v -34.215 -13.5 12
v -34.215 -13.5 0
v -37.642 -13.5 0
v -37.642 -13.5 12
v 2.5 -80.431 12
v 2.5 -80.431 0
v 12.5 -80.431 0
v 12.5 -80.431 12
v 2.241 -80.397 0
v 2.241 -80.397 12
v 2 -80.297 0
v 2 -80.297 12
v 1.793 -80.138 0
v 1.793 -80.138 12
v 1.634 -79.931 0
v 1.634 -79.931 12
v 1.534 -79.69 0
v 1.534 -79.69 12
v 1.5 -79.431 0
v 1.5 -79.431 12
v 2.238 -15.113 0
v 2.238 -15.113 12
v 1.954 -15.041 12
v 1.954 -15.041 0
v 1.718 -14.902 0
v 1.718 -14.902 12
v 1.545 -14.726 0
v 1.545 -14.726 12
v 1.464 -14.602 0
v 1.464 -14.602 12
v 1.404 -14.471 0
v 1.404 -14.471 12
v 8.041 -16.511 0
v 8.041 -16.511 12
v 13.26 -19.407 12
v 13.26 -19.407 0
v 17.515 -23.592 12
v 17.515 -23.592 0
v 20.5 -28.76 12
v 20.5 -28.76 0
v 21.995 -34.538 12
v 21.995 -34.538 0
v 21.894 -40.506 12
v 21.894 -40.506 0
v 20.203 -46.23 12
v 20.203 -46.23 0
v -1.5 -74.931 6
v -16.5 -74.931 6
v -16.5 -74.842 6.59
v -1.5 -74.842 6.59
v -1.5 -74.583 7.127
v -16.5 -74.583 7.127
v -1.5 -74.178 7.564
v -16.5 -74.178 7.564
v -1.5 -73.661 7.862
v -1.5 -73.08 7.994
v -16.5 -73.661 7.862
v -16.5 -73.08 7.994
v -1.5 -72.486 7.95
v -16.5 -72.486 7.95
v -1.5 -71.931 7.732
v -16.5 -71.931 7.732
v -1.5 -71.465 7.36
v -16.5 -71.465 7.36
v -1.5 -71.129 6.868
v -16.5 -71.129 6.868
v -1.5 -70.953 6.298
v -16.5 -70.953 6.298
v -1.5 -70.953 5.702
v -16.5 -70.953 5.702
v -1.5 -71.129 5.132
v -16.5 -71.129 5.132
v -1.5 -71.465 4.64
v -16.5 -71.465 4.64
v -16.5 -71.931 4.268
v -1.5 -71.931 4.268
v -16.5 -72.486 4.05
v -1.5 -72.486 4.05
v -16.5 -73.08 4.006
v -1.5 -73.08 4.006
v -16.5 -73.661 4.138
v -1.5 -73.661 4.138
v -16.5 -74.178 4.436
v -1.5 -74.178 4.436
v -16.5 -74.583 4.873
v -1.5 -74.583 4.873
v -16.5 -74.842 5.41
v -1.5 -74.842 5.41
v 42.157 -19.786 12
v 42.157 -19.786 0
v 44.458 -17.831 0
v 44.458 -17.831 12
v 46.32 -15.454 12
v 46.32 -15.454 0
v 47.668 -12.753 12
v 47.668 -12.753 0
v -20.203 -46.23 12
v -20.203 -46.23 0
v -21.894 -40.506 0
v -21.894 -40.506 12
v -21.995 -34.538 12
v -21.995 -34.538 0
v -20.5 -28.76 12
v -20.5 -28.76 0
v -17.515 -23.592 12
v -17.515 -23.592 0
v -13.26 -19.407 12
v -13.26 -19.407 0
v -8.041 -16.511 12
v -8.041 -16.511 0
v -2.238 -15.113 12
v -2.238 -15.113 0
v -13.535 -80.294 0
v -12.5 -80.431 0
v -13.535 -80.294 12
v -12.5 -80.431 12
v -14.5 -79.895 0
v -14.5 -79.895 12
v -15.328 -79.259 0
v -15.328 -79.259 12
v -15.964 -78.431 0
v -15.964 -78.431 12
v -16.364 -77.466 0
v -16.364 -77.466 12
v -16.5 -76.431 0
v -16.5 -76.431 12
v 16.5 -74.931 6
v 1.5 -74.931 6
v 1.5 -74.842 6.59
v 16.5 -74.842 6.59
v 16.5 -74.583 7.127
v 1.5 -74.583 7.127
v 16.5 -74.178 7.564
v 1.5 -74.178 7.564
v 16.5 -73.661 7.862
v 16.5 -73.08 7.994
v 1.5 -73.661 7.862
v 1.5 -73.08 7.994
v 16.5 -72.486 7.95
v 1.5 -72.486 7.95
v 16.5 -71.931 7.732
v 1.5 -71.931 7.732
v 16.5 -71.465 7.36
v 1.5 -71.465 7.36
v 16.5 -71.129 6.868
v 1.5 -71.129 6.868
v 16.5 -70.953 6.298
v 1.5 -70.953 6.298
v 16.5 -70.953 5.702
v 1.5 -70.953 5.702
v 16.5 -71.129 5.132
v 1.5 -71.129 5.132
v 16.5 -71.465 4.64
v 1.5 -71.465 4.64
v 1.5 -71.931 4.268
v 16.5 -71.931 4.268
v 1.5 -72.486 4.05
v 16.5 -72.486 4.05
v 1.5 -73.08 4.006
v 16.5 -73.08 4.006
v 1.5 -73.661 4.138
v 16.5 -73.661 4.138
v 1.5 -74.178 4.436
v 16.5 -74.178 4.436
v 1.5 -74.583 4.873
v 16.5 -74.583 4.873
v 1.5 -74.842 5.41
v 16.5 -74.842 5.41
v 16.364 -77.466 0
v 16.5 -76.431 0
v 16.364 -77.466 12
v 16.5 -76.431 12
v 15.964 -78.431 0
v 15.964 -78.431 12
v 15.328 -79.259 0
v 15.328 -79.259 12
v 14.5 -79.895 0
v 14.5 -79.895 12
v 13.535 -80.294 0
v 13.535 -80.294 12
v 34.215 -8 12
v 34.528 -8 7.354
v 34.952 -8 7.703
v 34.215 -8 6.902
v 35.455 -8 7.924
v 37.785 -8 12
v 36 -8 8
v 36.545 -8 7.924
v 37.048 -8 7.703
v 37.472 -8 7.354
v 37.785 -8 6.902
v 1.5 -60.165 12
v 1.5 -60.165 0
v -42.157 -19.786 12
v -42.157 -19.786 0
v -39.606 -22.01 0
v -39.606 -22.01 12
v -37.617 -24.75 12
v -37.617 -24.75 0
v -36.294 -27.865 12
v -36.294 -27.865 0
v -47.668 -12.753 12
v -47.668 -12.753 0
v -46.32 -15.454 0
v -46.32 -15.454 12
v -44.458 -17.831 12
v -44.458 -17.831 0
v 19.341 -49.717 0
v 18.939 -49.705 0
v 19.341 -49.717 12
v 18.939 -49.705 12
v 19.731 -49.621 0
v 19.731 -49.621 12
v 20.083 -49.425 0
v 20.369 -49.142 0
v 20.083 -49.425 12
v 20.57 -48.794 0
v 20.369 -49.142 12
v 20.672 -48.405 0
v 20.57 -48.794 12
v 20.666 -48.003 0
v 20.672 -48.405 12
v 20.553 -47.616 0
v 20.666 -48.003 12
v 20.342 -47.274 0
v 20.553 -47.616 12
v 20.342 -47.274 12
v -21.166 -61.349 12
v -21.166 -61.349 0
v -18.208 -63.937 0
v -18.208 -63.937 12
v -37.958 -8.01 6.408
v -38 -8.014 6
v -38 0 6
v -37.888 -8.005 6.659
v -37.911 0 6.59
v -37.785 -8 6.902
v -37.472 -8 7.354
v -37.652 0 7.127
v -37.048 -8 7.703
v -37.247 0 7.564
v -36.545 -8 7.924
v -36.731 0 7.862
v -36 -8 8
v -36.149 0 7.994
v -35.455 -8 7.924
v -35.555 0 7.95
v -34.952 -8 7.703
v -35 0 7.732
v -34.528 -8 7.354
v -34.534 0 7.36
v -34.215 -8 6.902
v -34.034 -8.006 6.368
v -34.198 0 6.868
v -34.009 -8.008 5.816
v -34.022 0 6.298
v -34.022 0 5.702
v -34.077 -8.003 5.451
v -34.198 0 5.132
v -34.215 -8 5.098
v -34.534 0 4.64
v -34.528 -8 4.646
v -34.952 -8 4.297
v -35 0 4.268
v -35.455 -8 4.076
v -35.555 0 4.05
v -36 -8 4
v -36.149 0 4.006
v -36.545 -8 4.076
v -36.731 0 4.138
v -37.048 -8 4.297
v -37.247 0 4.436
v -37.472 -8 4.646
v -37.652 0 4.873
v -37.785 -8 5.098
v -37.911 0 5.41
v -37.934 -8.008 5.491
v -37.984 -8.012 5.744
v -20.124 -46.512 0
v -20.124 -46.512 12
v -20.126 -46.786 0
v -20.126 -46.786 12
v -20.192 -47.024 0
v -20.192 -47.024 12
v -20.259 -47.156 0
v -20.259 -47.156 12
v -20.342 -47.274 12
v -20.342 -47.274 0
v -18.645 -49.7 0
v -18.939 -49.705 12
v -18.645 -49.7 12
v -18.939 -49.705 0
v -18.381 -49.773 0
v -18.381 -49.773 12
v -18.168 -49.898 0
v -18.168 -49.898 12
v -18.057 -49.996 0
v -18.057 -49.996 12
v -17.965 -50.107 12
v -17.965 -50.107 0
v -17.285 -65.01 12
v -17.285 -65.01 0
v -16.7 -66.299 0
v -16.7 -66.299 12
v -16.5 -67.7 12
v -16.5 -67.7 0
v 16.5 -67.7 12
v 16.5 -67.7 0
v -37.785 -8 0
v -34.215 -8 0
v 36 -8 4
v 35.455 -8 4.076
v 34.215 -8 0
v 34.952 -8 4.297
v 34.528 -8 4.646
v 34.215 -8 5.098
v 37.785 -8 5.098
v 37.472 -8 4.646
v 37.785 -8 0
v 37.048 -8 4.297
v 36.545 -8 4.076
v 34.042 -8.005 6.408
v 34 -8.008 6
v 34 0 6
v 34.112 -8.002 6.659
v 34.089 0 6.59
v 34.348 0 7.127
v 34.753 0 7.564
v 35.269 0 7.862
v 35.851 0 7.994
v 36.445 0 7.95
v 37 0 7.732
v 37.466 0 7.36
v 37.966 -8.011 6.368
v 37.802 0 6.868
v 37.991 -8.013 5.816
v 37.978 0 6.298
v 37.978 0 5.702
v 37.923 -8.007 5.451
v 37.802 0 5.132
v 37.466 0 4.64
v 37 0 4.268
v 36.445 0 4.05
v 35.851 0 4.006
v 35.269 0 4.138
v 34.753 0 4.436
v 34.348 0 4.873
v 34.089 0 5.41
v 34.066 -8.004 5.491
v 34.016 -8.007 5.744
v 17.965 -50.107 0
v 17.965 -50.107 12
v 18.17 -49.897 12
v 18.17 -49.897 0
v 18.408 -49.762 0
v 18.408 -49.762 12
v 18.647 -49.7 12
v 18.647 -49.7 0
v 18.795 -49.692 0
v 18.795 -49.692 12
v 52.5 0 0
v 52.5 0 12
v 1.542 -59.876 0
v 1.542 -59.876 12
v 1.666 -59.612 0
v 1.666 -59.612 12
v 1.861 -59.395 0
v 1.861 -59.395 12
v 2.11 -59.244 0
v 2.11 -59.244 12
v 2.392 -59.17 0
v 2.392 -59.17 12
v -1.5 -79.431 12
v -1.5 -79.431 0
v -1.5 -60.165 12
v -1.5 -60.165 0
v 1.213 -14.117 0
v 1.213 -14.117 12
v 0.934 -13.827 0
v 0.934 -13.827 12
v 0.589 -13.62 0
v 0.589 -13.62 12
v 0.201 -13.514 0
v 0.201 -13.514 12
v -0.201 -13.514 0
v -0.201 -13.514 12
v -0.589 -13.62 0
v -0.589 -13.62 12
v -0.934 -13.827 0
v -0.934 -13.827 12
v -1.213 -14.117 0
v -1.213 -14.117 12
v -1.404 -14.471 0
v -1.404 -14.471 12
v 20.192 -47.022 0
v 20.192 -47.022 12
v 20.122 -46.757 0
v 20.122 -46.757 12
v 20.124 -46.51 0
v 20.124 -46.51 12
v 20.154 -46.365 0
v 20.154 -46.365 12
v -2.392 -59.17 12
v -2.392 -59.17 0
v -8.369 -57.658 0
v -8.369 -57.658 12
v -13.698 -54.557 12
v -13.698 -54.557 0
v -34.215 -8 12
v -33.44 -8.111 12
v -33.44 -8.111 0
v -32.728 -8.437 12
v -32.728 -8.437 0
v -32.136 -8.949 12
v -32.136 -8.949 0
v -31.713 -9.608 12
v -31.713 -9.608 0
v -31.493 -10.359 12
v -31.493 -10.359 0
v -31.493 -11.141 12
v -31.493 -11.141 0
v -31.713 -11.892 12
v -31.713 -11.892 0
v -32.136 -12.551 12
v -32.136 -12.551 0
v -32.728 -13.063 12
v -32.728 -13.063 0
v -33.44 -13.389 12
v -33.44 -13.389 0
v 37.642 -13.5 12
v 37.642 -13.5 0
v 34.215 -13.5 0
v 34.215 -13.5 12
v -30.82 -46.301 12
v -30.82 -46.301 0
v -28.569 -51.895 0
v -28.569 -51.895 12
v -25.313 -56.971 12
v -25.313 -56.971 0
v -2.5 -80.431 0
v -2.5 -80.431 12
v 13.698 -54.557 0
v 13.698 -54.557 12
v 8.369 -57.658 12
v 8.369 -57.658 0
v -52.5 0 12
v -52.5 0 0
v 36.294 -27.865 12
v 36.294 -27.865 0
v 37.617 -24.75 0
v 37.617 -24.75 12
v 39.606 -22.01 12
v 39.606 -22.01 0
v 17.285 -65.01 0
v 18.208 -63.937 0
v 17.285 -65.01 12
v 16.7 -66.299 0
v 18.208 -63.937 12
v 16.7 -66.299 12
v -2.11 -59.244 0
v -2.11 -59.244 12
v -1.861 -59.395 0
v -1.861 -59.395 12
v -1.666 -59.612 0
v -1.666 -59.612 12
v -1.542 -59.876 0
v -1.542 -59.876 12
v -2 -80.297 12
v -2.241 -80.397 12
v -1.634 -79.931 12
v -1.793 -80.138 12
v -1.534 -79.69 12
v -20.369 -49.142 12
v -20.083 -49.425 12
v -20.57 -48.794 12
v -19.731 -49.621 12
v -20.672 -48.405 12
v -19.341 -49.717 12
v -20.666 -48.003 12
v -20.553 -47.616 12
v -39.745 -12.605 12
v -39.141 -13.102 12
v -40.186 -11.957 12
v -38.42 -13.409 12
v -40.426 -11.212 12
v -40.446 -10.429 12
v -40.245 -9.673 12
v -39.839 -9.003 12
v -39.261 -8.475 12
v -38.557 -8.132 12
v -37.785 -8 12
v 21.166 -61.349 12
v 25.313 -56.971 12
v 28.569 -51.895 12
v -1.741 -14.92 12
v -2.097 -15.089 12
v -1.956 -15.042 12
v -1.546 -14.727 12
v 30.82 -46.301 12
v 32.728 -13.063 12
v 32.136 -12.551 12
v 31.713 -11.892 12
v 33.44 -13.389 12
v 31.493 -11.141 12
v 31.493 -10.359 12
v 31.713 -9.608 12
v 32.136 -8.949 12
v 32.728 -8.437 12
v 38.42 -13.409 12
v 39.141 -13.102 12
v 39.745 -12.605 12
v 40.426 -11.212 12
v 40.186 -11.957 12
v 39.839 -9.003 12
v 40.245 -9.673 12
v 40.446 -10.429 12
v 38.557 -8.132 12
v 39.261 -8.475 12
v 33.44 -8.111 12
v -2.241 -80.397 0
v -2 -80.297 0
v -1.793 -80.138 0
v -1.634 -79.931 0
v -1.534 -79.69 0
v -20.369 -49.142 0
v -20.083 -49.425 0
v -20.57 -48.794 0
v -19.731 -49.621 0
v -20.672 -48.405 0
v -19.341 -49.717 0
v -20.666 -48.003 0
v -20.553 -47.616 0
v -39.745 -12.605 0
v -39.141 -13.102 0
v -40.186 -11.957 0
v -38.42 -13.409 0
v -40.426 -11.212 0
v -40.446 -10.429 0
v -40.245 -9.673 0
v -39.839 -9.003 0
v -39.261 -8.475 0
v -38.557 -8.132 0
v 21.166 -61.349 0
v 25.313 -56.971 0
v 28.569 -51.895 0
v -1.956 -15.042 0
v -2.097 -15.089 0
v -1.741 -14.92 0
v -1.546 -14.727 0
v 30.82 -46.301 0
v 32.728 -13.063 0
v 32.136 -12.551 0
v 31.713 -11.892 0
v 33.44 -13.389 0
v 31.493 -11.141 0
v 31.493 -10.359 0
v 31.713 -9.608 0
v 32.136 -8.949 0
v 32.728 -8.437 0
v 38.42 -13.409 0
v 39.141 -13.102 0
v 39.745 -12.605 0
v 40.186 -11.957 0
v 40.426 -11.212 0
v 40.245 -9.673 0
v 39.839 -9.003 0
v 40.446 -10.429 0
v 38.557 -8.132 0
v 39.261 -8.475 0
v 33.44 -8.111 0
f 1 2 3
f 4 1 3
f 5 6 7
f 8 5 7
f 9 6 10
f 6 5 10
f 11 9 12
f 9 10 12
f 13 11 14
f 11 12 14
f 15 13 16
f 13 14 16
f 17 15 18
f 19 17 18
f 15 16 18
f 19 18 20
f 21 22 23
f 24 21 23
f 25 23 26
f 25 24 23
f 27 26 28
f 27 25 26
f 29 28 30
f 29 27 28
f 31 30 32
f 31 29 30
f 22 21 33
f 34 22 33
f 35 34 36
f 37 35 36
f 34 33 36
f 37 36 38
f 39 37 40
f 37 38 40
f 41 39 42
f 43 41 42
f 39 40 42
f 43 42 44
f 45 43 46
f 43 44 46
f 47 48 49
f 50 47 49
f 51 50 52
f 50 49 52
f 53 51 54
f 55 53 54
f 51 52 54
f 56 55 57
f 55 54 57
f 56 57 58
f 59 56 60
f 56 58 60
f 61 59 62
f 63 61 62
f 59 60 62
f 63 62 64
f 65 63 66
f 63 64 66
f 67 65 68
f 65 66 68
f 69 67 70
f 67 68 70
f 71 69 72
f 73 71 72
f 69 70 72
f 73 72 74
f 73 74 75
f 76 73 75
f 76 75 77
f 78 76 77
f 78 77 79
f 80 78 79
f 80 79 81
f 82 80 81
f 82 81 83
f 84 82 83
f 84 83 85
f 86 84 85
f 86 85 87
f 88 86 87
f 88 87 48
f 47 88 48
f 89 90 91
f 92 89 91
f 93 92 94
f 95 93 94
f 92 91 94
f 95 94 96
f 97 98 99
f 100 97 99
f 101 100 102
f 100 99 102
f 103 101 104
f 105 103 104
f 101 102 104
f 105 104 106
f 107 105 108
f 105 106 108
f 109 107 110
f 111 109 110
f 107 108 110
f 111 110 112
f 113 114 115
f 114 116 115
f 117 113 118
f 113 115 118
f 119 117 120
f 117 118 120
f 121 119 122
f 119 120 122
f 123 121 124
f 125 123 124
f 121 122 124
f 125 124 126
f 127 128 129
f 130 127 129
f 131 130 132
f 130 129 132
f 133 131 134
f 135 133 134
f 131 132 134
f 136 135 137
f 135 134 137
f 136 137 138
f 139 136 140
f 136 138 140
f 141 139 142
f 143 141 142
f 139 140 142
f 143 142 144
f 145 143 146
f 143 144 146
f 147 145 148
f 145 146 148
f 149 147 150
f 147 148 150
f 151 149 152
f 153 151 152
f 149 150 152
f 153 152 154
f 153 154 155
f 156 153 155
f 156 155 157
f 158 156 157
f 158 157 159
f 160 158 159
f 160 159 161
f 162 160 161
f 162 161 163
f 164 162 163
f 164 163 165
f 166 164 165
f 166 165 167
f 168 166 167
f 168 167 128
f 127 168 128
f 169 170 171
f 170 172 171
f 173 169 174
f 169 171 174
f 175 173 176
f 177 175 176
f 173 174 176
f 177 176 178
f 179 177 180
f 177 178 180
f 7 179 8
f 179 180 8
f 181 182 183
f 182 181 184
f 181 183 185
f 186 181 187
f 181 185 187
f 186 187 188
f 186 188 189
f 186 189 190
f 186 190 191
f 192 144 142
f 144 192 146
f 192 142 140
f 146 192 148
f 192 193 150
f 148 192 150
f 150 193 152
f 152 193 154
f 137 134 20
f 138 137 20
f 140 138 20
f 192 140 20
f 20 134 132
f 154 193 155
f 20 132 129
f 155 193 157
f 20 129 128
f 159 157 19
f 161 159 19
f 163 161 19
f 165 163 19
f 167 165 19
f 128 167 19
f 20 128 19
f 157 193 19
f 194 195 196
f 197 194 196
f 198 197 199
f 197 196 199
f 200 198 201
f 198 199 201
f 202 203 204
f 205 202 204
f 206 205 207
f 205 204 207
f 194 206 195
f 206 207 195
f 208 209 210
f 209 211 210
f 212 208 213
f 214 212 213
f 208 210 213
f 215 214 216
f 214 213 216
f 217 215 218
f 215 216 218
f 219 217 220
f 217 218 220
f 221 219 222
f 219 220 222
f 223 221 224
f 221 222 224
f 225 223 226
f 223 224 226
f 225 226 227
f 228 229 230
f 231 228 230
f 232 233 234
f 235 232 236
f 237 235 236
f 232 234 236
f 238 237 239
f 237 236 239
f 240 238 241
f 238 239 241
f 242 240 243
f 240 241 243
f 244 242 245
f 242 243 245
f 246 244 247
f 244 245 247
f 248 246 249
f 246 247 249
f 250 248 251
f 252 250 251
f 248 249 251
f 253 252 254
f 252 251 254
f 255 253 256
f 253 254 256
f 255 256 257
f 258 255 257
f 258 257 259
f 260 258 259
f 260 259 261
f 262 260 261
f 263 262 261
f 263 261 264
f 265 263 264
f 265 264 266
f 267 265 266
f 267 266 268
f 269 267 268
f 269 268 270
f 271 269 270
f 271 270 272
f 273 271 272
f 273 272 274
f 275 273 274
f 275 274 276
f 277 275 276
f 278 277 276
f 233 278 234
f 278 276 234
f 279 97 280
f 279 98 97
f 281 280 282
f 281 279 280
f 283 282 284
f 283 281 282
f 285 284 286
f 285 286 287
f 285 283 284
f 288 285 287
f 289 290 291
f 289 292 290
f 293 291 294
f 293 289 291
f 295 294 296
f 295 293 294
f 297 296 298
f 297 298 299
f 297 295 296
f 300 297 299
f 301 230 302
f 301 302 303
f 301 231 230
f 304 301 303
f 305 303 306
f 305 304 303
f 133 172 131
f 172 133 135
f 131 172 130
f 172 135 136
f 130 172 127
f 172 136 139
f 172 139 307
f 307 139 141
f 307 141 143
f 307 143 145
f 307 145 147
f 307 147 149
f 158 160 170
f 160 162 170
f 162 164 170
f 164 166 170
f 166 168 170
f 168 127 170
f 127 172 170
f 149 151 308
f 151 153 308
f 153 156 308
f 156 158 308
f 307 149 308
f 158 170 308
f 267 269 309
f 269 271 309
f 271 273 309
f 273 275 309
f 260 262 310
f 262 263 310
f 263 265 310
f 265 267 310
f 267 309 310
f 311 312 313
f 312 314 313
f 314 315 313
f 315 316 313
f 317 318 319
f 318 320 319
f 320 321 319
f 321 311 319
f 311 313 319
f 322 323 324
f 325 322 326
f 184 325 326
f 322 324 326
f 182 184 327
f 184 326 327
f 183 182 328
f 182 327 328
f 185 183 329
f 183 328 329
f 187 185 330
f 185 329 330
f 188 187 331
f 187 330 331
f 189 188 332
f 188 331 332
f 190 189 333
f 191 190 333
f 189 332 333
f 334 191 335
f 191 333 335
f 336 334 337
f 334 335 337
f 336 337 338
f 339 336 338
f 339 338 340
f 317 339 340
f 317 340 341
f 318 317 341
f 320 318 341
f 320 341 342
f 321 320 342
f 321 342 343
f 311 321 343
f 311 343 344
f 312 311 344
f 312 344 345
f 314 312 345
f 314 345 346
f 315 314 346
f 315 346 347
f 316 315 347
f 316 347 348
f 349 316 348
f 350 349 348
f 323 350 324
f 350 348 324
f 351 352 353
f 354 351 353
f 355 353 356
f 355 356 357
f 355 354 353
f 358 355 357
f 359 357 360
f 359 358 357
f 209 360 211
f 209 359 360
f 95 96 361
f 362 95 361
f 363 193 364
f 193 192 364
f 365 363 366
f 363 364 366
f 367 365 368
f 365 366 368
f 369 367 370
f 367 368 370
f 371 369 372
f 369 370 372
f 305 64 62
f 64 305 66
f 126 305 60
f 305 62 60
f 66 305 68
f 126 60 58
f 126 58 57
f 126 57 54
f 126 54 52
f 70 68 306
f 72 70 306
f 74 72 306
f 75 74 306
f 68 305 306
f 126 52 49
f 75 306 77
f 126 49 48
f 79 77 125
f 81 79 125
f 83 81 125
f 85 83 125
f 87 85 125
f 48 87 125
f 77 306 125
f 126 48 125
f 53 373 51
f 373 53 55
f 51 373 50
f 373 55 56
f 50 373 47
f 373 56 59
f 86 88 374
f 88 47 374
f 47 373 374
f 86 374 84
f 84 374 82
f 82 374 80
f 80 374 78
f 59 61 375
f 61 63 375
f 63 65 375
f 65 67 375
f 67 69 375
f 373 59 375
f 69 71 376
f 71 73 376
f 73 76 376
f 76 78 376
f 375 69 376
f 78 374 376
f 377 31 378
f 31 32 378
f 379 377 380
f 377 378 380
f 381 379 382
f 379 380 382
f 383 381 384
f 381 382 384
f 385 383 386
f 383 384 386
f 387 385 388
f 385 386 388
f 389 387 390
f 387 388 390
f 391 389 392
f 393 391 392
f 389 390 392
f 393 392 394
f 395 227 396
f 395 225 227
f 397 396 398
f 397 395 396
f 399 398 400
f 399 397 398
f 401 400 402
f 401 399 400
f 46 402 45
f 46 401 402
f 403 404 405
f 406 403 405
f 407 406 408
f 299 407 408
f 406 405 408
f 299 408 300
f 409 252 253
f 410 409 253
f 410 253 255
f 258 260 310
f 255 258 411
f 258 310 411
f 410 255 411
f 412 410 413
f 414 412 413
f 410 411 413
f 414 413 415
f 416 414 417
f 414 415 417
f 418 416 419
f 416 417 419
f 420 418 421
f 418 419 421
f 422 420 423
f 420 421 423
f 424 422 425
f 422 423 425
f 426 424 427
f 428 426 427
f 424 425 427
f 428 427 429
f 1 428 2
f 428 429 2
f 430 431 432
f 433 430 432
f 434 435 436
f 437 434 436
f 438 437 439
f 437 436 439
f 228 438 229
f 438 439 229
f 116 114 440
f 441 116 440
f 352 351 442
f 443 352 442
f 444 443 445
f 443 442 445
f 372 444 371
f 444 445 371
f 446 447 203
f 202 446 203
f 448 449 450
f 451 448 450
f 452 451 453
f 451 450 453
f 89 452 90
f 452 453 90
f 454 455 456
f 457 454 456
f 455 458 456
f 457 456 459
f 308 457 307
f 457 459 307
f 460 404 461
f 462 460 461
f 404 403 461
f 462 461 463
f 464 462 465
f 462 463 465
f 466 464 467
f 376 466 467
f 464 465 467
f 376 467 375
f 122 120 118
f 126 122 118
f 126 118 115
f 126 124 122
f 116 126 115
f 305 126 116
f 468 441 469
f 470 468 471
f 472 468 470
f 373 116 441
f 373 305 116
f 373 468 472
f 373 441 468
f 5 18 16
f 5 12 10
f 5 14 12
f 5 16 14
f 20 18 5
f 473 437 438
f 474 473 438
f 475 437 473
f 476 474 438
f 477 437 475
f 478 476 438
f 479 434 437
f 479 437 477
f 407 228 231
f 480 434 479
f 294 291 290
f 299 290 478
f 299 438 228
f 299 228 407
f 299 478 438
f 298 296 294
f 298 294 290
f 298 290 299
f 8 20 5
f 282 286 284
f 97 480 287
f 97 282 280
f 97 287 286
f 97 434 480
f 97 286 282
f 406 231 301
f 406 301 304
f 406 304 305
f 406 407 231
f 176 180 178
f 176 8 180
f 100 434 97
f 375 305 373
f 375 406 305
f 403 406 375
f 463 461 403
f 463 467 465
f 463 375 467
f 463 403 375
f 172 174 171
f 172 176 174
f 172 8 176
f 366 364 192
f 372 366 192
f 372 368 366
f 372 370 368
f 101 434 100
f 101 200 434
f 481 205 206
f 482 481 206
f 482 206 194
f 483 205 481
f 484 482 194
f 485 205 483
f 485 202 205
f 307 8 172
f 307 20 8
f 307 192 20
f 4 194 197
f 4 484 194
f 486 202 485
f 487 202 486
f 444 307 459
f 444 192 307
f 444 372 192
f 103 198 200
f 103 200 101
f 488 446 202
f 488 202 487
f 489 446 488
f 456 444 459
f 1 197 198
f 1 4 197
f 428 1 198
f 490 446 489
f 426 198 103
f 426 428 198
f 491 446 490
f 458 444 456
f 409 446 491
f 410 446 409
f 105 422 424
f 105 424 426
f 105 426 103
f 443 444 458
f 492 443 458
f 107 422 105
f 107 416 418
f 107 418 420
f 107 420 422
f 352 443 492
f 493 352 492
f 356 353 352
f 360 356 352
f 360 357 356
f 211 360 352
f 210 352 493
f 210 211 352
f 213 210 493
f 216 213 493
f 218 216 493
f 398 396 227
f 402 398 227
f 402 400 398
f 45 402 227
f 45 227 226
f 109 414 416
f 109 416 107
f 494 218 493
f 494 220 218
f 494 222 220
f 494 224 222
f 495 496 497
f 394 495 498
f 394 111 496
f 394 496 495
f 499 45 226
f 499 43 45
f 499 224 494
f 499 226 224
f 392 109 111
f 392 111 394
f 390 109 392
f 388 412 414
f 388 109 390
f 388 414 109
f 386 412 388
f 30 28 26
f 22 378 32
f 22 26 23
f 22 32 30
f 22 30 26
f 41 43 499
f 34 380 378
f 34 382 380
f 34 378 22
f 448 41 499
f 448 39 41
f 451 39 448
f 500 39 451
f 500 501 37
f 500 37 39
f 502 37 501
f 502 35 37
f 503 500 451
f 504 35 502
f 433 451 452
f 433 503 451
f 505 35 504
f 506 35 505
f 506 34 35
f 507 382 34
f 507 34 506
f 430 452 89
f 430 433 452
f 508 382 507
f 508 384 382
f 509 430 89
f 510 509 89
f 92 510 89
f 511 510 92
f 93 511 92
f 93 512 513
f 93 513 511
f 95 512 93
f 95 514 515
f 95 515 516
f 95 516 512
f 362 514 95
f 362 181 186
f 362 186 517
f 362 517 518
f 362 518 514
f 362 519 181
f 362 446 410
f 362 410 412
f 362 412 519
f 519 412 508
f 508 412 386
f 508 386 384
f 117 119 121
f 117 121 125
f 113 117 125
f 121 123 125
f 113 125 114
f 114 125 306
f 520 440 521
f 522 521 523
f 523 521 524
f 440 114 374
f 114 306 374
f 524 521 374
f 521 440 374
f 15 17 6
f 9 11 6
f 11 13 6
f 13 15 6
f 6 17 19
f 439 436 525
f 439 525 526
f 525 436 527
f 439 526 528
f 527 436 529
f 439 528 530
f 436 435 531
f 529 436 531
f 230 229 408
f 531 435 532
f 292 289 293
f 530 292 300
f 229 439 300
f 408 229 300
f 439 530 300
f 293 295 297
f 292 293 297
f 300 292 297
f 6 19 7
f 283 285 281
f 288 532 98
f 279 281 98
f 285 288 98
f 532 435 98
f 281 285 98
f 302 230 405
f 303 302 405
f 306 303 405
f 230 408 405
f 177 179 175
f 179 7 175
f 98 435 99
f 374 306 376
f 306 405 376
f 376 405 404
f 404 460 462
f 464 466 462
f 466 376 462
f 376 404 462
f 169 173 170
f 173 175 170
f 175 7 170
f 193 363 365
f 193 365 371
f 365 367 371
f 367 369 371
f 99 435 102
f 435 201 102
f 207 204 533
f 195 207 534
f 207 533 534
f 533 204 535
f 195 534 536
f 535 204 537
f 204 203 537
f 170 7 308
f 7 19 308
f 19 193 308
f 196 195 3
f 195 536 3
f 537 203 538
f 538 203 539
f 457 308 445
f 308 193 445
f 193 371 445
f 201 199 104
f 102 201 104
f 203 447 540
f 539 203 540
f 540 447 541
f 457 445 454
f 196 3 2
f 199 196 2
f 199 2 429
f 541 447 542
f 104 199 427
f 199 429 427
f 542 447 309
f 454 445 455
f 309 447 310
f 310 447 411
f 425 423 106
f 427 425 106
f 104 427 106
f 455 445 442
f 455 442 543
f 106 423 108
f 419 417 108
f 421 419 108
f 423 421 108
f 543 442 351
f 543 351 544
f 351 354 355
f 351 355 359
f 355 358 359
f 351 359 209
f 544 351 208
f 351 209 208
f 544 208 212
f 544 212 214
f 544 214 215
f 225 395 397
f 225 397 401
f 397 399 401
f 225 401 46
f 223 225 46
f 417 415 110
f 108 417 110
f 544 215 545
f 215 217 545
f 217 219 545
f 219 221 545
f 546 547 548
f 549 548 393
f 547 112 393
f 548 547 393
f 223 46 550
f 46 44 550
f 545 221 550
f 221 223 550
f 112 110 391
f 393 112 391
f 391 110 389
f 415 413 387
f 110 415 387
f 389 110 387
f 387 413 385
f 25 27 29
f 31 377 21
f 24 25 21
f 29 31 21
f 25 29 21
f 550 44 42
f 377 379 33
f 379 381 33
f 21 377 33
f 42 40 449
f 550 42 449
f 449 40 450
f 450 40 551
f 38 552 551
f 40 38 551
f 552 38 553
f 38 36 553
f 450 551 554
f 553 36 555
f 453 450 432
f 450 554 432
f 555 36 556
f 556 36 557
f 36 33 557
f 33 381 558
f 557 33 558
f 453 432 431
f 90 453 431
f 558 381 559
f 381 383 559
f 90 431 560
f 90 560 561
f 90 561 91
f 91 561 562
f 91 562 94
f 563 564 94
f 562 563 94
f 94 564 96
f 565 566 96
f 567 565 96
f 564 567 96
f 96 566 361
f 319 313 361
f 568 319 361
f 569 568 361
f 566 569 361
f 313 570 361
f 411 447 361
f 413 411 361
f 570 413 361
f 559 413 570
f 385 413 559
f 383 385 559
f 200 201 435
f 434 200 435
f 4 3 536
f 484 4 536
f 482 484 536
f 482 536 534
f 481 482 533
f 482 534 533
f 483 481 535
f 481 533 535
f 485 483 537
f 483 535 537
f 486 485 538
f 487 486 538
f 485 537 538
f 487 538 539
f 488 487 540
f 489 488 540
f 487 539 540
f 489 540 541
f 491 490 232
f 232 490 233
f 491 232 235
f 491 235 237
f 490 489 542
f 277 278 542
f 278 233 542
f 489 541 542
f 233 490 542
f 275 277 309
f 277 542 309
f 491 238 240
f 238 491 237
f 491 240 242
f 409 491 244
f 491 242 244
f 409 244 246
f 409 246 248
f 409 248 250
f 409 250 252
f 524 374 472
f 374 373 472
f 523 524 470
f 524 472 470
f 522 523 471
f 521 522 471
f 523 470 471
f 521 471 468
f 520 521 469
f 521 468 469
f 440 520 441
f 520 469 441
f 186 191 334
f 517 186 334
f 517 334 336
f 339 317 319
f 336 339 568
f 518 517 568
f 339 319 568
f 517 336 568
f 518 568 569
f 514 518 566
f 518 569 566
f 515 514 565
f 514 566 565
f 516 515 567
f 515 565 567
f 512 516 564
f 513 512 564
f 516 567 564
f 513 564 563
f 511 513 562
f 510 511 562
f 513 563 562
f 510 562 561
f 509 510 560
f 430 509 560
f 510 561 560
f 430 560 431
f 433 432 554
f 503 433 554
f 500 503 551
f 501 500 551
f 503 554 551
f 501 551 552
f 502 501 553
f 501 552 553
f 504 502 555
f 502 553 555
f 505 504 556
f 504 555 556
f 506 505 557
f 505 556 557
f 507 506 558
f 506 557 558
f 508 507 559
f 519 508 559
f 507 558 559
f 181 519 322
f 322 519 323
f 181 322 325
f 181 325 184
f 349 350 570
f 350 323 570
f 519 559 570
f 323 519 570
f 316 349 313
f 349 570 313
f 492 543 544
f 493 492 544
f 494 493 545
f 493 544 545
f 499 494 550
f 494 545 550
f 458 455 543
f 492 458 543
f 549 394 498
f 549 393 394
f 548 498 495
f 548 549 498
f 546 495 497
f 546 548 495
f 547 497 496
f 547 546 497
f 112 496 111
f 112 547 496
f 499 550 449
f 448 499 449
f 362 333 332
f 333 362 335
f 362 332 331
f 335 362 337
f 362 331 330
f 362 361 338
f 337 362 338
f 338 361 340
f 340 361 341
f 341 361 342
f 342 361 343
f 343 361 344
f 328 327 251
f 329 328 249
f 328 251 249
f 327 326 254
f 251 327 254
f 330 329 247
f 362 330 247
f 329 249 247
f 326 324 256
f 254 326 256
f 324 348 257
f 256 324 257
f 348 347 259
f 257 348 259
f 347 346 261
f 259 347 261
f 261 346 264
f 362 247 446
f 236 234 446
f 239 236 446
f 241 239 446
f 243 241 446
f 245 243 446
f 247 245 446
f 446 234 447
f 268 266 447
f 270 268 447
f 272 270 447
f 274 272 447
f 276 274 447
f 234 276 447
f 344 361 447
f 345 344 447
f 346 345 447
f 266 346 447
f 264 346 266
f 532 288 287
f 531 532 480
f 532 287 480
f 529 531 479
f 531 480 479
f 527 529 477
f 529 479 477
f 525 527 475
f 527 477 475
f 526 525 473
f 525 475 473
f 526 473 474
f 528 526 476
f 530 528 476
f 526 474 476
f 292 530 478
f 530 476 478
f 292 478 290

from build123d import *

# Parameters (mm, degrees)
F1_DEPTH = 12
F2_R     = 5
F3_R     = 2
F4_DEPTH = 69.001
F5_R     = 4
F6_R     = 2
F7_DEPTH = 12
F8_R     = 1.5
F9_DEPTH = 25
F10_R    = 1


with BuildPart() as f1:
    # F0 (on Top) → F1 (new body)
    with BuildSketch(Plane.XY):
        with BuildLine():
            Line((52.5, 0), (-52.5, 0))
            Line((-52.5, 0), (-47.6682177495, -12.7529115916))
            ThreePointArc((-47.6682177495, -12.7529115916), (-45.4487126417, -16.689553935), (-42.1574376197, -19.7864660409))
            ThreePointArc((-42.1574376197, -19.7864660409), (-38.5340554499, -23.3236951077), (-36.2940938248, -27.8650010584))
            Line((-36.2940938248, -27.8650010584), (-30.8201520188, -46.3009960956))
            ThreePointArc((-30.8201520188, -46.3009960956), (-27.0602921577, -54.5098124511), (-21.1662026167, -61.3494703824))
            Line((-21.1662026167, -61.3494703824), (-16.5, -65.4307906954))
            Line((-16.5, -65.4307906954), (-16.5, -80.4307906954))
            Line((-16.5, -80.4307906954), (-1.5, -80.4307906954))
            Line((-1.5, -80.4307906954), (-1.5, -59.2491515674))
            ThreePointArc((-1.5, -59.2491515674), (0, -15), (1.5, -59.2491515674))
            Line((1.5, -59.2491515674), (1.5, -80.4307906954))
            Line((1.5, -80.4307906954), (16.5, -80.4307906954))
            Line((16.5, -80.4307906954), (16.5, -65.4307906954))
            Line((16.5, -65.4307906954), (21.1662026167, -61.3494703824))
            ThreePointArc((21.1662026167, -61.3494703824), (27.0602921577, -54.5098124511), (30.8201520188, -46.3009960956))
            Line((30.8201520188, -46.3009960956), (36.2940938248, -27.8650010584))
            ThreePointArc((36.2940938248, -27.8650010584), (38.5340554499, -23.3236951077), (42.1574376197, -19.7864660409))
            ThreePointArc((42.1574376197, -19.7864660409), (45.4487126417, -16.689553935), (47.6682177495, -12.7529115916))
            Line((47.6682177495, -12.7529115916), (52.5, 0))
        make_face()
        with BuildLine():
            Line((-34.2147789885, -13.5), (-37.6424851382, -13.5))
            ThreePointArc((-37.6424851382, -13.5), (-40.4638530749, -10.8213679366), (-37.7852210115, -8))
            Line((-37.7852210115, -8), (-34.2147789885, -8))
            ThreePointArc((-34.2147789885, -8), (-31.4647789885, -10.75), (-34.2147789885, -13.5))
        make_face(mode=Mode.SUBTRACT)
        with BuildLine():
            ThreePointArc((37.7852210115, -8), (40.4638530749, -10.8213679366), (37.6424851382, -13.5))
            Line((37.6424851382, -13.5), (34.2147789885, -13.5))
            ThreePointArc((34.2147789885, -13.5), (31.4647789885, -10.75), (34.2147789885, -8))
            Line((34.2147789885, -8), (37.7852210115, -8))
        make_face(mode=Mode.SUBTRACT)
    extrude(amount=F1_DEPTH)

    # F2
    f2_edges = [f1.edges().sort_by_distance(p)[0] for p in [
        (-16.5, -65.430791, 6),
        (16.5, -65.430791, 6),
    ]]
    fillet(f2_edges, radius=F2_R)

    # F3 (on face) → F4 (cut, through all)
    with BuildSketch(Plane(origin=(-16.5, 0, 0), x_dir=(0, -1, 0), z_dir=(-1, 0, 0))):
        with Locations((72.9307906954, 6)):
            Circle(F3_R)
    extrude(amount=-F4_DEPTH, mode=Mode.SUBTRACT)

    # F5
    f5_edges = [f1.edges().sort_by_distance(p)[0] for p in [
        (-16.5, -80.430791, 6),
        (16.5, -80.430791, 6),
    ]]
    fillet(f5_edges, radius=F5_R)

    # F6 (on face) → F7 (cut)
    with BuildSketch(Plane(origin=(0, 0, 0), x_dir=(-1, 0, 0), z_dir=(0, 1, 0))):
        with Locations((-36, 6)):
            Circle(F6_R)
        with Locations((36, 6)):
            Circle(F6_R)
    extrude(amount=-F7_DEPTH, mode=Mode.SUBTRACT)

    # F8 (on face) → F9 (cut)
    with BuildSketch(Plane.XY.offset(12)):
        with Locations((0, -15)):
            Circle(F8_R)
        with Locations((-19.1824626938, -48.225)):
            Circle(F8_R)
        with Locations((19.1824626938, -48.225)):
            Circle(F8_R)
    extrude(amount=-F9_DEPTH, mode=Mode.SUBTRACT)

    # F10
    f10_edges = [f1.edges().sort_by_distance(p)[0] for p in [
        (1.49914, -15.05079, 6),
        (-1.49914, -15.05079, 6),
        (-19.888047, -46.901312, 6),
        (-18.388907, -49.497898, 6),
        (18.388907, -49.497898, 6),
        (19.888047, -46.901312, 6),
        (1.5, -59.249152, 6),
        (-1.5, -59.249152, 6),
        (1.5, -80.430791, 6),
        (-1.5, -80.430791, 6),
    ]]
    fillet(f10_edges, radius=F10_R)


solid = f1.part
